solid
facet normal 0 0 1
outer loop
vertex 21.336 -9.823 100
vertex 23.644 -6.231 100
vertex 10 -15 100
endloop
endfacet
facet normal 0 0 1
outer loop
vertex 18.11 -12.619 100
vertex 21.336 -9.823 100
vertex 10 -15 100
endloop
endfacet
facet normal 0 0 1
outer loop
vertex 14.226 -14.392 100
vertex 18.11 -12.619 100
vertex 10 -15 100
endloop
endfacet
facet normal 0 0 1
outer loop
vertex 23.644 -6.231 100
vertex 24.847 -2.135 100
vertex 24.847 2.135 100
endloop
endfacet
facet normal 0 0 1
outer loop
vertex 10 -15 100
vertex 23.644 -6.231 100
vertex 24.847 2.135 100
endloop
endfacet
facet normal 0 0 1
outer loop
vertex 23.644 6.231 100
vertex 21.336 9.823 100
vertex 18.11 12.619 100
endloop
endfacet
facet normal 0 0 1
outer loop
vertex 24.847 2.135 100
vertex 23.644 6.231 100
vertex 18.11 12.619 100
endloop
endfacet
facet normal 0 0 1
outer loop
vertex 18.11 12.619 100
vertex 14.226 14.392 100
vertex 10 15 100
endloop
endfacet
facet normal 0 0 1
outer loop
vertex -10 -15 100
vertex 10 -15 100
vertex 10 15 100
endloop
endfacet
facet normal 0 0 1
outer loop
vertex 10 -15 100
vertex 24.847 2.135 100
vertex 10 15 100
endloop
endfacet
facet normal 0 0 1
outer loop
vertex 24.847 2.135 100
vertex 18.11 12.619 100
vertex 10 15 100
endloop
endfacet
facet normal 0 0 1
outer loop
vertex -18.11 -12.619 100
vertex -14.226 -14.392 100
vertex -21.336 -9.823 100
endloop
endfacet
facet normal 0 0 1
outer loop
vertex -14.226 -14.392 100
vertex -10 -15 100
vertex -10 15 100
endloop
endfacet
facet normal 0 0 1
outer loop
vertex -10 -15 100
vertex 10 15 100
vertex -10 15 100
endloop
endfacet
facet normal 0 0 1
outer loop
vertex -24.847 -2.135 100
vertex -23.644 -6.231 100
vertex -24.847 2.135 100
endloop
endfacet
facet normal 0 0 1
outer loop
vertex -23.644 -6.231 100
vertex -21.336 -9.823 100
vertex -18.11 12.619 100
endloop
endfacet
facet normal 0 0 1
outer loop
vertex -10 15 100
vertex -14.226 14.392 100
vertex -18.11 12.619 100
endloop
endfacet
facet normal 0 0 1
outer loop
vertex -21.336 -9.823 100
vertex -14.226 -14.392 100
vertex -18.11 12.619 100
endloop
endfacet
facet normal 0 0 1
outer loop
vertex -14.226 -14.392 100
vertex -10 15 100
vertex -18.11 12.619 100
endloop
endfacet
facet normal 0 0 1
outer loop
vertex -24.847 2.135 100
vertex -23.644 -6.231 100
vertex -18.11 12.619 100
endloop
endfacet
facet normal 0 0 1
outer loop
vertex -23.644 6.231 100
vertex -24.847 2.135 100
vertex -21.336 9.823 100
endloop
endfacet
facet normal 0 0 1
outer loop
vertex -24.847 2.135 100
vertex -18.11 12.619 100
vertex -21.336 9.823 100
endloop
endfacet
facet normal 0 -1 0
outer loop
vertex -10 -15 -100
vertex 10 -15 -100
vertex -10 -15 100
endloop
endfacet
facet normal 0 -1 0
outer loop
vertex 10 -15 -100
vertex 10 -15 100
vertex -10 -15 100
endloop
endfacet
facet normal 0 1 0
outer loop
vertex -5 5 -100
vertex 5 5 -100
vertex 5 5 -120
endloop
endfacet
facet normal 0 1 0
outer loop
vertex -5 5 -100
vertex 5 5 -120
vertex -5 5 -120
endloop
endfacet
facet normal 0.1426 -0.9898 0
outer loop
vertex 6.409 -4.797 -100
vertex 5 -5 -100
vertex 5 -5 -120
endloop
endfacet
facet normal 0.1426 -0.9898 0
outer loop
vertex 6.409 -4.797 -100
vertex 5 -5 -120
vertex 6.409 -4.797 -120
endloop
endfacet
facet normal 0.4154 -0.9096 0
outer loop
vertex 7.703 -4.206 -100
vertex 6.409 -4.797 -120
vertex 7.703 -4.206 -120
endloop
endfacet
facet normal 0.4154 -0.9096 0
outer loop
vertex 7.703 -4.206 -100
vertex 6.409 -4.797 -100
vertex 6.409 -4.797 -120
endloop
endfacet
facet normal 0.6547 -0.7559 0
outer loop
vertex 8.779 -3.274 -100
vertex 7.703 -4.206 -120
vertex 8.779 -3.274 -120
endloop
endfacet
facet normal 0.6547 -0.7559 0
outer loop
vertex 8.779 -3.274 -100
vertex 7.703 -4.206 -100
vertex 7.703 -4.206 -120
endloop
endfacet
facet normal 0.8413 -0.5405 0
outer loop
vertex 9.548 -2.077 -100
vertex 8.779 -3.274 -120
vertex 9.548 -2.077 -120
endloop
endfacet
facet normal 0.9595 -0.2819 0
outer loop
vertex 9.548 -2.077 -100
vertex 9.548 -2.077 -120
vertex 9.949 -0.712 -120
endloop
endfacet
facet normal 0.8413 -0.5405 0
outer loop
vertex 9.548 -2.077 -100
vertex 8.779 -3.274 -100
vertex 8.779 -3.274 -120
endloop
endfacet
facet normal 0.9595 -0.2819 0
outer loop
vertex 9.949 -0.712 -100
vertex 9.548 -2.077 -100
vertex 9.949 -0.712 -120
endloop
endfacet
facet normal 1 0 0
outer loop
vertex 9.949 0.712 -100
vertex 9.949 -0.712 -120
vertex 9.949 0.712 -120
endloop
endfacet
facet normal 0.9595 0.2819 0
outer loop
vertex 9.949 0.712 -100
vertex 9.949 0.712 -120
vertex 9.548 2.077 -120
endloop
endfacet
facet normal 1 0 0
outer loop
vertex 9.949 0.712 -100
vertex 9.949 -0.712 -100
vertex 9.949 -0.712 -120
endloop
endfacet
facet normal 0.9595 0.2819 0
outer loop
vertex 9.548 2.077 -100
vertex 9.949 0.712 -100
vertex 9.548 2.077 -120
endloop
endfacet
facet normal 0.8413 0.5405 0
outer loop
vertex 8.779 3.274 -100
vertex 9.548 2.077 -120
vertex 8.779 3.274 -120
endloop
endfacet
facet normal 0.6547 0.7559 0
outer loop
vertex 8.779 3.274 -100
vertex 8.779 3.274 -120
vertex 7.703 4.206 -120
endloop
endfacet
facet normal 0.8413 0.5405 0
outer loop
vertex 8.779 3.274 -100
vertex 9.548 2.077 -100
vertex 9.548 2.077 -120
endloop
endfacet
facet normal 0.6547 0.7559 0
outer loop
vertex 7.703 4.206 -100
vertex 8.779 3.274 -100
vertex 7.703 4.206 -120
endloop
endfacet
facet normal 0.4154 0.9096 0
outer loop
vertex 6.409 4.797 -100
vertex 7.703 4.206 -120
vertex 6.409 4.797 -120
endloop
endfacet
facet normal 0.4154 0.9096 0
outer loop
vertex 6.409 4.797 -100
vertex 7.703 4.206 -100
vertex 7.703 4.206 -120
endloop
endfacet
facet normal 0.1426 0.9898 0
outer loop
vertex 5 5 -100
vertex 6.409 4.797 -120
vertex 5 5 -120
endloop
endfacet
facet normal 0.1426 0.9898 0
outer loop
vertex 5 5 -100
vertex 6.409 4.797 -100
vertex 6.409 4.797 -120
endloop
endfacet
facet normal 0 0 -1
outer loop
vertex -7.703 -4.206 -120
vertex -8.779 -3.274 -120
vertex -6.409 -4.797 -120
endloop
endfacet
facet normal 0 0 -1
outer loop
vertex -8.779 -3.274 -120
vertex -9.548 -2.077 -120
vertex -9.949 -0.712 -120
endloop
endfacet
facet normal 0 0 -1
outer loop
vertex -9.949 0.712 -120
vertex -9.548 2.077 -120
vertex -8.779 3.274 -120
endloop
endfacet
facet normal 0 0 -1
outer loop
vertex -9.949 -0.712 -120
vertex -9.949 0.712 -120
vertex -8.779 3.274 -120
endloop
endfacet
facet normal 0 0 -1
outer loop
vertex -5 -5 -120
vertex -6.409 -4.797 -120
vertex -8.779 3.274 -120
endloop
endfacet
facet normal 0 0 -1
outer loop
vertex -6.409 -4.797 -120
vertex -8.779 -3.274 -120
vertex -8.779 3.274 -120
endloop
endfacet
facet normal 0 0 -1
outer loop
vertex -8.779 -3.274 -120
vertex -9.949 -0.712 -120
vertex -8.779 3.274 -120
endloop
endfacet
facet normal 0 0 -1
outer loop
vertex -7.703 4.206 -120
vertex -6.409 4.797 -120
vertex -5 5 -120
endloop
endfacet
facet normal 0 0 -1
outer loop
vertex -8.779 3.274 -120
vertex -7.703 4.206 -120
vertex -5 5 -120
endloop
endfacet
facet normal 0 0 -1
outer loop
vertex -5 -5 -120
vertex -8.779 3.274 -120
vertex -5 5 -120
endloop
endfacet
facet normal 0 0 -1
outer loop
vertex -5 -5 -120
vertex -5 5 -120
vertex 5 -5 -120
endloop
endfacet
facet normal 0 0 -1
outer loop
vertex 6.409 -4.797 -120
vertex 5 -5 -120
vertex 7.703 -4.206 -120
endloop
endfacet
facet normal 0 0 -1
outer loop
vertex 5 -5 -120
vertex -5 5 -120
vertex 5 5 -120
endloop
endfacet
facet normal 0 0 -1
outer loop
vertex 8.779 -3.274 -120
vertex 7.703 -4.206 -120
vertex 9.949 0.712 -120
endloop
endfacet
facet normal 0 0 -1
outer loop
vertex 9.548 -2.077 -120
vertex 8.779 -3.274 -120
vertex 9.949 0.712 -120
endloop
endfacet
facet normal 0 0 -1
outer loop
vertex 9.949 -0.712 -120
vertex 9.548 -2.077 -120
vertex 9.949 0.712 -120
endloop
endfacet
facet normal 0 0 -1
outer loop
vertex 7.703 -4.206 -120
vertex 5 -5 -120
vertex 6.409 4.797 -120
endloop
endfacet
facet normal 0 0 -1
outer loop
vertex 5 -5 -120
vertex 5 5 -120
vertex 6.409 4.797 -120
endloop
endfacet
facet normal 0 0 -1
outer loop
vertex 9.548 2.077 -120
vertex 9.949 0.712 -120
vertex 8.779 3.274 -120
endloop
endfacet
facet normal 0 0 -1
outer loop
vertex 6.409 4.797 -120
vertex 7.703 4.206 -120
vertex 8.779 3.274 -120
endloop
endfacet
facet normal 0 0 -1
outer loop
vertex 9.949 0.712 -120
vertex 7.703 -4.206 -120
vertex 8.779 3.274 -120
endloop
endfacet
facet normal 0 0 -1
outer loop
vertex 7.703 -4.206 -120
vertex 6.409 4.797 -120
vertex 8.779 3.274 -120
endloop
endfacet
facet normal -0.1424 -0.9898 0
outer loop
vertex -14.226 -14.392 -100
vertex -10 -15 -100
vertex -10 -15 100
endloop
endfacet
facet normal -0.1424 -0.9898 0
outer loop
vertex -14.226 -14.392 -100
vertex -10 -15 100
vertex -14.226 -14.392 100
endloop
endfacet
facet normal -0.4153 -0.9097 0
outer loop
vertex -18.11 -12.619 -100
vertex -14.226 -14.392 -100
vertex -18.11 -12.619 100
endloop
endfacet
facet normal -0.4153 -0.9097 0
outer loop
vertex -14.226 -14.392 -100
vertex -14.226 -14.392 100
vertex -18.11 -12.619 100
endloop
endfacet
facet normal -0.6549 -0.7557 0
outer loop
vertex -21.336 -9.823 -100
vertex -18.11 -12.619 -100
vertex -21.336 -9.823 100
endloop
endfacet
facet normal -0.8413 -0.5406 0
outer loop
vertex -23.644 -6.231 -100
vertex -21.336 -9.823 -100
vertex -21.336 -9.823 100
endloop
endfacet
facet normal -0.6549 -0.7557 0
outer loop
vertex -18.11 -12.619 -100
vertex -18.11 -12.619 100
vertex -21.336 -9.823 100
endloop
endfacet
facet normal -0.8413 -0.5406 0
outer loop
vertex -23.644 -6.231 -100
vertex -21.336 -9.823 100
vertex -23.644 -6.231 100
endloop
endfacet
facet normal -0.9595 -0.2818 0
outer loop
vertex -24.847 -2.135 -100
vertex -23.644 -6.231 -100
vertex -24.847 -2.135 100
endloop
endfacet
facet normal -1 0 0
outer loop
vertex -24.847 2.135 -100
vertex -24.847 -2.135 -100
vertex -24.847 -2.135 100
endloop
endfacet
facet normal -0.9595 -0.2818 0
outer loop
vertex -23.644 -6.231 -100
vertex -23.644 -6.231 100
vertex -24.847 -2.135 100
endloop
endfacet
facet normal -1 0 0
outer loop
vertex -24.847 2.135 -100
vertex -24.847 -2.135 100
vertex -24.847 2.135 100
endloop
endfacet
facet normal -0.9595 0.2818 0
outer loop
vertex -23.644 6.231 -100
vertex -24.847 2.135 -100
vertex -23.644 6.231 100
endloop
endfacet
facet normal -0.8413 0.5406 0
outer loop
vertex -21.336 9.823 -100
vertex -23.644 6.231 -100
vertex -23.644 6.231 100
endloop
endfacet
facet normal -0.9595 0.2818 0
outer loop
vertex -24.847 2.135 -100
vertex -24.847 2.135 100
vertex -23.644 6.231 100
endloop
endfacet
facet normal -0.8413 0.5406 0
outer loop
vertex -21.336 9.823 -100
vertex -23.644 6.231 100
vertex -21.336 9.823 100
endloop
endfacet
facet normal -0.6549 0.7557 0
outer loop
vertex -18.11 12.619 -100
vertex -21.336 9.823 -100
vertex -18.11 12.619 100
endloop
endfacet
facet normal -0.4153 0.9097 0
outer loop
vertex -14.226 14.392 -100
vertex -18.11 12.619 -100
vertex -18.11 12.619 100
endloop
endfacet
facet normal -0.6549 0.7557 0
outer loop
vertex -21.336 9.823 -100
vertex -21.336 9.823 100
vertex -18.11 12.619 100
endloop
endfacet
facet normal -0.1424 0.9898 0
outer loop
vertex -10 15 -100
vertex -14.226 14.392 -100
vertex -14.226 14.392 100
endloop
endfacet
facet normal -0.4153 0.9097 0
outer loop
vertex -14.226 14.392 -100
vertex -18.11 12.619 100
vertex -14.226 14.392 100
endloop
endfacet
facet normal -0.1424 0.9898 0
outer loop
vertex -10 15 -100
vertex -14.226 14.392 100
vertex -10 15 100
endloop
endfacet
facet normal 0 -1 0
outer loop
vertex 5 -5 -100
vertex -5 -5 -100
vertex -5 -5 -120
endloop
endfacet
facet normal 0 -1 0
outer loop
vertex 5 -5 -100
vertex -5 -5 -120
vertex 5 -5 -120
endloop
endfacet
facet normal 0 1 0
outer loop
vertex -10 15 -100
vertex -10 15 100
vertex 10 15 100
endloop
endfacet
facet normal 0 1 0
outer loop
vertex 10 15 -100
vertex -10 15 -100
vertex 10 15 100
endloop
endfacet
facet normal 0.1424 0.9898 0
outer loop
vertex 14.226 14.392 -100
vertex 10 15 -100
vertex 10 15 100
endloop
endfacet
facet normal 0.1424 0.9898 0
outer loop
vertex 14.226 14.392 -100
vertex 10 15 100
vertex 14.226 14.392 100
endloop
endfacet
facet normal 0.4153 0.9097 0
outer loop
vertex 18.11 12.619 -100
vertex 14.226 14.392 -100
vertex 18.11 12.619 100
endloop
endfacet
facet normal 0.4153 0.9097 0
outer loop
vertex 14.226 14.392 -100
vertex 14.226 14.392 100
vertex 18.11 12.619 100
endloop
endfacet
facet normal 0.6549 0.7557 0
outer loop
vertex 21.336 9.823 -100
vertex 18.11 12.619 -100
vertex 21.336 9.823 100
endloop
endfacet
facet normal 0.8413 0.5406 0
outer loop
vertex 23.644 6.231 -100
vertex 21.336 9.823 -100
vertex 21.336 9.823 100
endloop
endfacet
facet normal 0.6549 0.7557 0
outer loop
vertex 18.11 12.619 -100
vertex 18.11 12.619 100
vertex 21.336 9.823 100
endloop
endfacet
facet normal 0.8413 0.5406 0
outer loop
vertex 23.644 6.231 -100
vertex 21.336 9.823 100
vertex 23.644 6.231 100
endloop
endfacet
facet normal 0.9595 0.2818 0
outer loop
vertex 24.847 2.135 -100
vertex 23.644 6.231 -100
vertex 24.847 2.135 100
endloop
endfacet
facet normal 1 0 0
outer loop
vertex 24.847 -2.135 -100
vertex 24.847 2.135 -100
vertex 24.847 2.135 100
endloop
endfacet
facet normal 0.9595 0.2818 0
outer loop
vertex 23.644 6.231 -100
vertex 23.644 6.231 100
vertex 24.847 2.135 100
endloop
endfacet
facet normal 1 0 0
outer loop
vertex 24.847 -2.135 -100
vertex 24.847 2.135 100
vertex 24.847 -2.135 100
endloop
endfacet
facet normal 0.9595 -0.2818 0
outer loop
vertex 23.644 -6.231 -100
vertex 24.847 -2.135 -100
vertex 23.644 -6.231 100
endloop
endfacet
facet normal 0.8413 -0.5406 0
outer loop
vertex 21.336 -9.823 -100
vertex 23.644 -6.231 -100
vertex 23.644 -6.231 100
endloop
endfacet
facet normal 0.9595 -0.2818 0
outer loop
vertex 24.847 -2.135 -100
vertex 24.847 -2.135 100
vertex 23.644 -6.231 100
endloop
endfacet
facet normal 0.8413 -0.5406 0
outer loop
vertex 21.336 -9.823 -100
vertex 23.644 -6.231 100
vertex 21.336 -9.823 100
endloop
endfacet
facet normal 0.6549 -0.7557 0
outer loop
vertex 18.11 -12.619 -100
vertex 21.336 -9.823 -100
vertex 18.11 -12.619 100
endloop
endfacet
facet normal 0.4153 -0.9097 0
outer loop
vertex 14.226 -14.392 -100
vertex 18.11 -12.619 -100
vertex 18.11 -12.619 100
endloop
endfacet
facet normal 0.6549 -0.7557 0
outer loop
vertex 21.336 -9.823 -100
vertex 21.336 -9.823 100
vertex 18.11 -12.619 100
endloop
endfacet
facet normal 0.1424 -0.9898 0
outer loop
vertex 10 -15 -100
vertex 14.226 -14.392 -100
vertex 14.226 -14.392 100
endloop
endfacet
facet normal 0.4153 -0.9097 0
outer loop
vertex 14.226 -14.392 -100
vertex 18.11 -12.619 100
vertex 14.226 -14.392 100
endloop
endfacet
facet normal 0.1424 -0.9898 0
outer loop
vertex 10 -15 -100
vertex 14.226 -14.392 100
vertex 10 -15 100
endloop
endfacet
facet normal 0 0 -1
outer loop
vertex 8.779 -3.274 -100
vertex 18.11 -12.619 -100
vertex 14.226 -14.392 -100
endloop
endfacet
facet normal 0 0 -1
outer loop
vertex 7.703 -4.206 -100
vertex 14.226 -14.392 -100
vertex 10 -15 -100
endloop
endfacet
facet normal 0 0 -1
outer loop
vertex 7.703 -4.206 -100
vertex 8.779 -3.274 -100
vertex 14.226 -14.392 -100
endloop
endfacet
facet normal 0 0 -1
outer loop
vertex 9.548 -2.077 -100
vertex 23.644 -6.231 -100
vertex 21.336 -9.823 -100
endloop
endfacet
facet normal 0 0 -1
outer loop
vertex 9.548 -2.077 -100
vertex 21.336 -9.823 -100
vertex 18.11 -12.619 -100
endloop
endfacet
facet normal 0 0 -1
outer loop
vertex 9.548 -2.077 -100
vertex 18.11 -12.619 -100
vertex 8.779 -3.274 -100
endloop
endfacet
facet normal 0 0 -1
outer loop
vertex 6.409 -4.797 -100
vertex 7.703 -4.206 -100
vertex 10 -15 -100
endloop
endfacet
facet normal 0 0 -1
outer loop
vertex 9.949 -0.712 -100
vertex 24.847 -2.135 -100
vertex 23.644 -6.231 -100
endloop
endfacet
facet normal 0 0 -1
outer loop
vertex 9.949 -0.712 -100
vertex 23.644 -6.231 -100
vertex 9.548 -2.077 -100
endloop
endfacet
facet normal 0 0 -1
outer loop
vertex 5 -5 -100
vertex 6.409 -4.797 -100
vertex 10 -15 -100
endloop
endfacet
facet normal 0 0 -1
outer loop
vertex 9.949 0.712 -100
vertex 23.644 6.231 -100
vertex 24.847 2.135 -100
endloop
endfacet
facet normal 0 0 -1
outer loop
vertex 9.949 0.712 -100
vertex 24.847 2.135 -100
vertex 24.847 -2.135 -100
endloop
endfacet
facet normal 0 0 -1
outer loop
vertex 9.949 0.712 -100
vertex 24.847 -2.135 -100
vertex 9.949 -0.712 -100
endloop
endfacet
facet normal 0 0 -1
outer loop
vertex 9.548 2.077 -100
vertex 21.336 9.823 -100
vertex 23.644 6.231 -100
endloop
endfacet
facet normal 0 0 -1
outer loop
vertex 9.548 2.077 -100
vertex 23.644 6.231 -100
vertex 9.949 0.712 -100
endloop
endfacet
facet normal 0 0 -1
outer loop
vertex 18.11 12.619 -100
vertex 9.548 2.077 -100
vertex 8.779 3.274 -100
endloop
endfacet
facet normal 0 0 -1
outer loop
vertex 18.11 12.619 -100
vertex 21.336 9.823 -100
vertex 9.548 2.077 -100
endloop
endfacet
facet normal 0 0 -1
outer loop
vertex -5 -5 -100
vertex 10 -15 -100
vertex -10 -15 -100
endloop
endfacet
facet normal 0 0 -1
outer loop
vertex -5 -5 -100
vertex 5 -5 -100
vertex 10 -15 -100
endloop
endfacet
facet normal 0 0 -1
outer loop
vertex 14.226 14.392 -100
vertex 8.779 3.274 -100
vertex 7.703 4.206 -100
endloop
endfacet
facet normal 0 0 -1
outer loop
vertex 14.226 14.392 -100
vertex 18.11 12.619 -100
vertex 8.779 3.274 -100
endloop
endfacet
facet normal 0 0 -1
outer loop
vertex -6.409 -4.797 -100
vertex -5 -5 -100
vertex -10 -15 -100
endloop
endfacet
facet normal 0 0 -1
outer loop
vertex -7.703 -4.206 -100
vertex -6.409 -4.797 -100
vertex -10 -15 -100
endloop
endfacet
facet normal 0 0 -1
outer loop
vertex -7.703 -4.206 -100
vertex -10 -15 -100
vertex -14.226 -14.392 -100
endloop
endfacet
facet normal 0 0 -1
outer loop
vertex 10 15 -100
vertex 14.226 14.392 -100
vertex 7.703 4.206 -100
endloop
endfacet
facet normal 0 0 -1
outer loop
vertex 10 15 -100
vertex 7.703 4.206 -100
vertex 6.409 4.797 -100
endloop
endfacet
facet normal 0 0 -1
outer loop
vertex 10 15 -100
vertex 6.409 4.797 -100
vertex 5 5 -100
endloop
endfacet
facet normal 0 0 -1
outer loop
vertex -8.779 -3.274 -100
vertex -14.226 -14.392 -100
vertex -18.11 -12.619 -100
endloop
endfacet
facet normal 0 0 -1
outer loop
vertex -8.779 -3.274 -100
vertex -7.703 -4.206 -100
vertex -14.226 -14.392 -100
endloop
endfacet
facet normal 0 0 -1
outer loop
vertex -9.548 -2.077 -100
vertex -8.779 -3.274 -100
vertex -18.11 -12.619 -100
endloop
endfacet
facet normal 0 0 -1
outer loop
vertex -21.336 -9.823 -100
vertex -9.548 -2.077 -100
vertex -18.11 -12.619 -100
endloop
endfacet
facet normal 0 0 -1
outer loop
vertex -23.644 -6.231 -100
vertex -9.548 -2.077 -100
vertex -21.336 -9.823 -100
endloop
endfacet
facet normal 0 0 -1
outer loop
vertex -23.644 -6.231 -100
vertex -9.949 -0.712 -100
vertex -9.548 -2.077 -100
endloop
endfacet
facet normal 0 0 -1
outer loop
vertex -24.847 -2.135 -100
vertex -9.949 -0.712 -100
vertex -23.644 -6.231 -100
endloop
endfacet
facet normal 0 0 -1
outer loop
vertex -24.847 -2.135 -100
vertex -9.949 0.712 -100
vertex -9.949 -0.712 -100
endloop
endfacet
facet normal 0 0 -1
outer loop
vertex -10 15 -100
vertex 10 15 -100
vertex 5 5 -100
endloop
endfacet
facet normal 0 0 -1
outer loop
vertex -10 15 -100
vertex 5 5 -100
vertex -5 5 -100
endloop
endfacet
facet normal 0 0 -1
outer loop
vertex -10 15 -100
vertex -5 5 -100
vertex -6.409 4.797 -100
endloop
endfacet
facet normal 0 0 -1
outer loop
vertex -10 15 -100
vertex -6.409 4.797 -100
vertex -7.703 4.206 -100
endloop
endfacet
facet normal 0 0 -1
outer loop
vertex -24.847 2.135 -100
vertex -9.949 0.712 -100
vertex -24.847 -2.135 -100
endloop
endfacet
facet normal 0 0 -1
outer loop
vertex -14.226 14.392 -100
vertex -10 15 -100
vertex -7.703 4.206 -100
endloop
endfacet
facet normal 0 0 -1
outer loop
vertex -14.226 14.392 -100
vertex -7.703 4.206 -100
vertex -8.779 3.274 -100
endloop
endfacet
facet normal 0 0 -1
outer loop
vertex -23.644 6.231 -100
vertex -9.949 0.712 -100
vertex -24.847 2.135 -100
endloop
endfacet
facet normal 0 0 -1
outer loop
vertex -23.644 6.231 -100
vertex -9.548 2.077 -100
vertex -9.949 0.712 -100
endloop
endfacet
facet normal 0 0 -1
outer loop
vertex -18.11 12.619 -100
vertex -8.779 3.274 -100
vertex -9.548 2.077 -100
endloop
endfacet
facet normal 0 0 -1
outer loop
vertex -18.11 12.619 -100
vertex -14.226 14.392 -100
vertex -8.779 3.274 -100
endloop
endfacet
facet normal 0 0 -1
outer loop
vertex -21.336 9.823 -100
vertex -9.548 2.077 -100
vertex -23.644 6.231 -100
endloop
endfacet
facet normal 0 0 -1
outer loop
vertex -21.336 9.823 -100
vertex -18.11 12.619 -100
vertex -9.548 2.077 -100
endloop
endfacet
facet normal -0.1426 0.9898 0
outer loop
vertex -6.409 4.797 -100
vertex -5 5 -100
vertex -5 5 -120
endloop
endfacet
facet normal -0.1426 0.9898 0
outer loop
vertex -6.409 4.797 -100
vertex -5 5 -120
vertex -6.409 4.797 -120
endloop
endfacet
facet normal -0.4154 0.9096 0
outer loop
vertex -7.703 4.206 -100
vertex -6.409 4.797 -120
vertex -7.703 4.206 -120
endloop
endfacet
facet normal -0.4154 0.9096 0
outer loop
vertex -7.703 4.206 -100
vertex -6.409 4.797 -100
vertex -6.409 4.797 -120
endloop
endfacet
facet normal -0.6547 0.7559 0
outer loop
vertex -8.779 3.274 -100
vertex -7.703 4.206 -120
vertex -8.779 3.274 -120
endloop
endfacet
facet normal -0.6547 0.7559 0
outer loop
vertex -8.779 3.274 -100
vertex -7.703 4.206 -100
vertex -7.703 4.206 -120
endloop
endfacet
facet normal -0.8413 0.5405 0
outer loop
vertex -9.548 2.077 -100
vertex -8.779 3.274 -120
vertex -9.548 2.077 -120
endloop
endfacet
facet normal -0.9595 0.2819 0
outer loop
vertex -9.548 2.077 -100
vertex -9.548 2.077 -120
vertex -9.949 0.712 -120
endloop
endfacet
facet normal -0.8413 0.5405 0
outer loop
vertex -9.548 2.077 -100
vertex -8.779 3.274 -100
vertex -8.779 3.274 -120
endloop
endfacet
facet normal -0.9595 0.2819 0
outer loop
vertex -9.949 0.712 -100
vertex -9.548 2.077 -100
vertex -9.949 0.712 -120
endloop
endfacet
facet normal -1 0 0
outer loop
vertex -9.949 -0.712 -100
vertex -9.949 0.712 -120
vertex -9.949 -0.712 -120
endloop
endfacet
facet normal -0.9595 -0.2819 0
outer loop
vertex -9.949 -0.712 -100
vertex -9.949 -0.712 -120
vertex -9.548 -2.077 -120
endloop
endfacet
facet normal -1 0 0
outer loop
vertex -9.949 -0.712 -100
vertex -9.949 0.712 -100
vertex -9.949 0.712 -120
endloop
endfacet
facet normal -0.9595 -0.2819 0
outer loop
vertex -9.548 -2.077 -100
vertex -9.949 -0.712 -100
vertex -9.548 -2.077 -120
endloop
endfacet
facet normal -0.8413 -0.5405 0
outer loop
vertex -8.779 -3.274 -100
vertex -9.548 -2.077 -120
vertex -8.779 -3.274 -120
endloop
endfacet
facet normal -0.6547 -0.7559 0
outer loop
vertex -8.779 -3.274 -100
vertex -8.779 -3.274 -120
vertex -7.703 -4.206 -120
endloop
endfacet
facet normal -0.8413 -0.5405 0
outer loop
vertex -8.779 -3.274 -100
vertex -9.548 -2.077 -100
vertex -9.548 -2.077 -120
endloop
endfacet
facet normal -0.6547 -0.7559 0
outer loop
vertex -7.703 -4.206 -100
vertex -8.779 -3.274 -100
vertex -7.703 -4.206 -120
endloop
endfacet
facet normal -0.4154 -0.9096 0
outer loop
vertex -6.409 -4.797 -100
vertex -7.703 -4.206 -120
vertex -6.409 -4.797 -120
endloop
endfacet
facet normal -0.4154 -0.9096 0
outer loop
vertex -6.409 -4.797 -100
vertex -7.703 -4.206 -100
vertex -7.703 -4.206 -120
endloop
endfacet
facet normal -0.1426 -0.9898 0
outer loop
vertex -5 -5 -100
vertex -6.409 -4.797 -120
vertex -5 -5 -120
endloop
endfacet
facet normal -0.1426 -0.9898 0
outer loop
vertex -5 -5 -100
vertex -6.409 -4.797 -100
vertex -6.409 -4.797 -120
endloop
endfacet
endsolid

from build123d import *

# Parameters (mm, degrees)
EXTRUDE_1_DEPTH = 100
EXTRUDE_2_DEPTH = 20


with BuildPart() as part:
    # 草图1 → 凸台-拉伸1 (new, symmetric)
    with BuildSketch(Plane.XY):
        with BuildLine():
            Line((-10, 15), (10, 15))
            ThreePointArc((10, 15), (25, 0), (10, -15))
            Line((10, -15), (-10, -15))
            ThreePointArc((-10, -15), (-25, 0), (-10, 15))
        make_face()
    extrude(amount=EXTRUDE_1_DEPTH, both=True)

    # 草图2 → 凸台-拉伸2 (add)
    with BuildSketch(Plane(origin=(0, 0, -100), x_dir=(-1, 0, 0), z_dir=(0, 0, -1))):
        with BuildLine():
            Line((-5, 5), (5, 5))
            ThreePointArc((5, 5), (10, 0), (5, -5))
            Line((5, -5), (-5, -5))
            ThreePointArc((-5, -5), (-10, 0), (-5, 5))
        make_face()
    extrude(amount=EXTRUDE_2_DEPTH)


solid = part.part
